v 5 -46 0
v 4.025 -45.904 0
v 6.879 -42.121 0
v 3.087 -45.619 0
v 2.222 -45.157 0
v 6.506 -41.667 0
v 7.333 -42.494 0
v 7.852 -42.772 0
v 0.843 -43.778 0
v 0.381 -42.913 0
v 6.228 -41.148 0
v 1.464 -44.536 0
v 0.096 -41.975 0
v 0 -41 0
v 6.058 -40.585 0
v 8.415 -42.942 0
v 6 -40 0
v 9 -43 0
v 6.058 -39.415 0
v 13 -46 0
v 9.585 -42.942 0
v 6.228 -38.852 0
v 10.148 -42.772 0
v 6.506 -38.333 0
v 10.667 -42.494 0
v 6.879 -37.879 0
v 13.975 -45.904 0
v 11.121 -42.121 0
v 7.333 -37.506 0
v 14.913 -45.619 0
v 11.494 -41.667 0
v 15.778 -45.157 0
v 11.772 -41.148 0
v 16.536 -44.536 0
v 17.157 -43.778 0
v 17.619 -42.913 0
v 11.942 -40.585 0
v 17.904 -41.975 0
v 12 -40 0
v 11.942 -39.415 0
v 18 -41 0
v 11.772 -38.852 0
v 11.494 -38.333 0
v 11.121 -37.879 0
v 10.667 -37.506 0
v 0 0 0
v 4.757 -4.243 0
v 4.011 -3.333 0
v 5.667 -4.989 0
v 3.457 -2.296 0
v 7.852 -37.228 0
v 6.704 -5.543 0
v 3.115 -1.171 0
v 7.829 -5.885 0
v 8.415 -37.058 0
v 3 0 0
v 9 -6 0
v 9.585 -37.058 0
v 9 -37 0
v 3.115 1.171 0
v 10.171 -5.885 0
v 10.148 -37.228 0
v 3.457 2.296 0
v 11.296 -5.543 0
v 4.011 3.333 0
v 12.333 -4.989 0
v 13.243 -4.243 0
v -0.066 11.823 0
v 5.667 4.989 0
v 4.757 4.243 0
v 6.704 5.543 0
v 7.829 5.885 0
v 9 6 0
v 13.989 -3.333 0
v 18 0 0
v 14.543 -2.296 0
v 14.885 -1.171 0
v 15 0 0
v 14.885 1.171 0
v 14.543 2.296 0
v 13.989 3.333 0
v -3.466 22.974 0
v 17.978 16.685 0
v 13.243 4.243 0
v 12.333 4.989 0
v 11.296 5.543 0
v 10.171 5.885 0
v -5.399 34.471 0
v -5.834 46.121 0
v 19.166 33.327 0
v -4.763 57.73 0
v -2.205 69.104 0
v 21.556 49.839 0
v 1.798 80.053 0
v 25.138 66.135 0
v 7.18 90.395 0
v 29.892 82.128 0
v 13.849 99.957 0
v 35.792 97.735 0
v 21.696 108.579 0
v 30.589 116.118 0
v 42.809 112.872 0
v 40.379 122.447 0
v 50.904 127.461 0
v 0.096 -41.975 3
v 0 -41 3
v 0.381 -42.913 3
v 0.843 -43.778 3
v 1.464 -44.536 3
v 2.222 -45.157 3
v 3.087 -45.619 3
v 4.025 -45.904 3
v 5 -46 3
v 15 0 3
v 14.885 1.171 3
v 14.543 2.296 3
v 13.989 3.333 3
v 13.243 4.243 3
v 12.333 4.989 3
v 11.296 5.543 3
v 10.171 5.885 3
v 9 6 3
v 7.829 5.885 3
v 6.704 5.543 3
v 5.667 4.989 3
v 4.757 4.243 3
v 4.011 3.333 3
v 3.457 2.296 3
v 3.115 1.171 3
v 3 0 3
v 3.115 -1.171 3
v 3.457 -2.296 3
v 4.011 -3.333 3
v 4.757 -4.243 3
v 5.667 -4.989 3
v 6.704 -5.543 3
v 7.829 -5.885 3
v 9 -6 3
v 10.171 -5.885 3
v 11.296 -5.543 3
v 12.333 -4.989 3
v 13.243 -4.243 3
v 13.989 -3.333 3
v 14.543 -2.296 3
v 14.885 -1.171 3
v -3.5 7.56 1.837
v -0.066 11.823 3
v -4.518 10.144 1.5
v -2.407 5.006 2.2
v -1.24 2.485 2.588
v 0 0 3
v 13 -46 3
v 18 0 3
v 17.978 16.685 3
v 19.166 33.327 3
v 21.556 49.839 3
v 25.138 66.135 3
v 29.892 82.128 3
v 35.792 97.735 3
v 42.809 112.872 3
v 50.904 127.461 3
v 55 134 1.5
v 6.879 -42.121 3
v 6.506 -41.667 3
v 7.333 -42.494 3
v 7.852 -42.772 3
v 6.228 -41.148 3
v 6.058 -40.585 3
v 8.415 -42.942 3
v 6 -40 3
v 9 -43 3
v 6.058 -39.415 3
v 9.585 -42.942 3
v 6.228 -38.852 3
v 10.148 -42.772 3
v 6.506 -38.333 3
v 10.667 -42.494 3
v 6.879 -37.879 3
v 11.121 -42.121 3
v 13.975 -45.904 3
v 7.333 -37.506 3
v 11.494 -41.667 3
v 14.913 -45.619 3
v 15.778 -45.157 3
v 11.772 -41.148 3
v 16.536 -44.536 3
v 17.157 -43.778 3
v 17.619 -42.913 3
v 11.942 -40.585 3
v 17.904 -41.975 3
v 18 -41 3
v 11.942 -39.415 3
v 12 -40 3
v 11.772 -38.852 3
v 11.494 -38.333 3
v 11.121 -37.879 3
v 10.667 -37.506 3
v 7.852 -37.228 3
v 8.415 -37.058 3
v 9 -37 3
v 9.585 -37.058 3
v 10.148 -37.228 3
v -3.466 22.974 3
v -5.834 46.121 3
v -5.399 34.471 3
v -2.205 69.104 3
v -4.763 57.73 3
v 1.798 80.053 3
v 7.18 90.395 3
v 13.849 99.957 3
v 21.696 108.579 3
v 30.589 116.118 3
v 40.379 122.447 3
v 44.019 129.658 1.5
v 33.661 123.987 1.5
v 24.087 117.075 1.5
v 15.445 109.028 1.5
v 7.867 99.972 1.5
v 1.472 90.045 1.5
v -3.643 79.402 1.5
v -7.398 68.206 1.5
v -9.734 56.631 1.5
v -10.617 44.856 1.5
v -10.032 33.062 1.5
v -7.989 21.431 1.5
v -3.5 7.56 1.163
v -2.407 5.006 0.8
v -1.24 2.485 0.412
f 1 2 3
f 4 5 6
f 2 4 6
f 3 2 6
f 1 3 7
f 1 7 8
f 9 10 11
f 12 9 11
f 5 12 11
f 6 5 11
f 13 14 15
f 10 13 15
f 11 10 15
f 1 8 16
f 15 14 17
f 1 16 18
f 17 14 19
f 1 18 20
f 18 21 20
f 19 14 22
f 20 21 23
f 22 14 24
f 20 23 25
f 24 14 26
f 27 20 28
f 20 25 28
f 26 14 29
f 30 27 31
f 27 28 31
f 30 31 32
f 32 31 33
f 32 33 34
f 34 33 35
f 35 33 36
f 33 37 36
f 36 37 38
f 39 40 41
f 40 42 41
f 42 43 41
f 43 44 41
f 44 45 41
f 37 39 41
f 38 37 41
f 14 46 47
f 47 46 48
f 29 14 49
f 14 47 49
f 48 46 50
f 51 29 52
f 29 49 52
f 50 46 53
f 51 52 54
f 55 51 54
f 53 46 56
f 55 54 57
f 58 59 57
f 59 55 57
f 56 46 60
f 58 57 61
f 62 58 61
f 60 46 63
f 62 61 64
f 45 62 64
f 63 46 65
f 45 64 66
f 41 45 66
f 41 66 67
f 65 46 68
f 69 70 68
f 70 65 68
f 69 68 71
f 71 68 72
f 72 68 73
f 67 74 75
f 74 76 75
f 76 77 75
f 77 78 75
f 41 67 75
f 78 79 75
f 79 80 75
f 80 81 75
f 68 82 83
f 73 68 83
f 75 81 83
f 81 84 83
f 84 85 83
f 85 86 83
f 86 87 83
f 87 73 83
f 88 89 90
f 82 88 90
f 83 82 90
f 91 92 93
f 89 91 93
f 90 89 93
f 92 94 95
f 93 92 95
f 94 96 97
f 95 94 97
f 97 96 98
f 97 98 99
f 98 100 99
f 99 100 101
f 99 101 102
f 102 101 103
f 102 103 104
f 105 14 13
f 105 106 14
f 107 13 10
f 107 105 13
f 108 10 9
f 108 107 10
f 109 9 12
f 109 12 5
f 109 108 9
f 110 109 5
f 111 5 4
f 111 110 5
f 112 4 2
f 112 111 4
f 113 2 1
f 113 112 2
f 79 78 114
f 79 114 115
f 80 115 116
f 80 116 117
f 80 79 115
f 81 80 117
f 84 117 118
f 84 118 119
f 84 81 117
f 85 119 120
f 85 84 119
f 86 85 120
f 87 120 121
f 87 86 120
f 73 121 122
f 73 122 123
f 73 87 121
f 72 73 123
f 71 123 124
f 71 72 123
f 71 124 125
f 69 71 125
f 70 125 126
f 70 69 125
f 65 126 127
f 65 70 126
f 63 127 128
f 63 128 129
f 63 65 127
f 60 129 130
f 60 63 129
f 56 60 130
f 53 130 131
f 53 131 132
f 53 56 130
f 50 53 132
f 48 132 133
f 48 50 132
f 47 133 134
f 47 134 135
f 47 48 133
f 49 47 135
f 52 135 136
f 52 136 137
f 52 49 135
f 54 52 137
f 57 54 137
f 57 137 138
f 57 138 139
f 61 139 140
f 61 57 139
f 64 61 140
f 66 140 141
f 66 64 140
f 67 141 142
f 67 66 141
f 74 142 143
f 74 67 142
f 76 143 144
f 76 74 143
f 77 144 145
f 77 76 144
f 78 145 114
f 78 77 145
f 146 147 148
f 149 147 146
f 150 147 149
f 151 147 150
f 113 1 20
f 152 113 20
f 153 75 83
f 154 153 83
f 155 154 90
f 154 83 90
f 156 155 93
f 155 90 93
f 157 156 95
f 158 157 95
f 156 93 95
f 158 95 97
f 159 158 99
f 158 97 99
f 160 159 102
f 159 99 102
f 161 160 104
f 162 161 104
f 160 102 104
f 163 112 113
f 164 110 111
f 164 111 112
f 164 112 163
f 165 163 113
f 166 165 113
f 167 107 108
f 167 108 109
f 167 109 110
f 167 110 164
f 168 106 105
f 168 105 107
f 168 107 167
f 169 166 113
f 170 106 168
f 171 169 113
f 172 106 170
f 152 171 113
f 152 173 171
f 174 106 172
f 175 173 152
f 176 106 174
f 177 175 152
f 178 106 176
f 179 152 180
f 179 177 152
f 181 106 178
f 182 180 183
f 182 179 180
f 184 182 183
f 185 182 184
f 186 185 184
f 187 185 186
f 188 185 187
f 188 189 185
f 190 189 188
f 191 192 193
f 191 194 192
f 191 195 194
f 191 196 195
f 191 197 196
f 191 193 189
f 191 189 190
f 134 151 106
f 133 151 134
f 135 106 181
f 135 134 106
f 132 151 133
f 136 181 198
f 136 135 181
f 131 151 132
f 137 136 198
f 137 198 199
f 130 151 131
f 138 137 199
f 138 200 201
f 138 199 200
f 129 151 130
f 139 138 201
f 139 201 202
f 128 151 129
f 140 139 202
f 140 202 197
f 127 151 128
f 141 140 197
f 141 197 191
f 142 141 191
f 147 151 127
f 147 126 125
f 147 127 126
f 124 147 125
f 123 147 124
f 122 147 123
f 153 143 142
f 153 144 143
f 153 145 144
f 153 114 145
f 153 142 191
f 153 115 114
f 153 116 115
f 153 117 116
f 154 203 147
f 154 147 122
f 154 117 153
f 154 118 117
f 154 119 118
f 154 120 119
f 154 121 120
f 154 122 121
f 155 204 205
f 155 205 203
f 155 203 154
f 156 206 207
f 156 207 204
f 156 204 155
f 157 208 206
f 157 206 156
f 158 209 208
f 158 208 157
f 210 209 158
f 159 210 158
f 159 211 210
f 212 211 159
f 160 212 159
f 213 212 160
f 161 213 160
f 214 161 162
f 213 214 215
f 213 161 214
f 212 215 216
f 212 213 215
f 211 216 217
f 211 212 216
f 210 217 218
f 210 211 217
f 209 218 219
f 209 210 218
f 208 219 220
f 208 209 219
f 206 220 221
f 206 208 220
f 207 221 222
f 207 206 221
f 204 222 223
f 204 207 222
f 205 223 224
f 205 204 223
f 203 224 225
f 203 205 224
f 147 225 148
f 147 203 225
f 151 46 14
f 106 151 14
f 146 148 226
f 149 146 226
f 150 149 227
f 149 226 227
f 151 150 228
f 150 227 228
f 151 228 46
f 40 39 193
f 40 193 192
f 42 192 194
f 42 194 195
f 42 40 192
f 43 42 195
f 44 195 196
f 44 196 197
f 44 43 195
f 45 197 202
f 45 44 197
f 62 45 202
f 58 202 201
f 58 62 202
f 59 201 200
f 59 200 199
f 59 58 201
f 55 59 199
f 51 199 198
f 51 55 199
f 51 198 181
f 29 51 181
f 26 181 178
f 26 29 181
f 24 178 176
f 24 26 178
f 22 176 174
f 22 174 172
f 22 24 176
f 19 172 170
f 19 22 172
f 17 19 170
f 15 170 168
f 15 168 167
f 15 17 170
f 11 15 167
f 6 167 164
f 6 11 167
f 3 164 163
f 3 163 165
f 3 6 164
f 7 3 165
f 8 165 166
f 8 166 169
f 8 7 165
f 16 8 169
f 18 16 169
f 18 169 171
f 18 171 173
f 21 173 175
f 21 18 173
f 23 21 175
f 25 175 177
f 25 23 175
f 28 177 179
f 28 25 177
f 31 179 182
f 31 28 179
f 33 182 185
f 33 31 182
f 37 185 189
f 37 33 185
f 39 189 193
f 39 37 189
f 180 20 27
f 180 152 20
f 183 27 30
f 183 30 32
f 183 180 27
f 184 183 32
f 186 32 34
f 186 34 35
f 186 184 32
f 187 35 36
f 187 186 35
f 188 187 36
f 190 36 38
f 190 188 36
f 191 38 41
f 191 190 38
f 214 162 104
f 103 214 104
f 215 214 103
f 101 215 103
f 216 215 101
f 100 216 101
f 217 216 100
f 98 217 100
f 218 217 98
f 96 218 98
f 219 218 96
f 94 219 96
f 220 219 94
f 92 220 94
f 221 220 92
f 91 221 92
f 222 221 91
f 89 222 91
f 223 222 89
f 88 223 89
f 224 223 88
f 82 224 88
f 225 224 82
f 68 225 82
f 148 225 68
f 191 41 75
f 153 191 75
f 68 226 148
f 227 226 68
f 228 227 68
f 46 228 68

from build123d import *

# Parameters (mm, degrees)
SKETCH_1_R      = 3
SKETCH_1_R_2    = 6
EXTRUDE_1_DEPTH = 3
FILLET_1_R      = 5


with BuildPart() as part:
    # 草图1 → 凸台-拉伸1 (new body)
    with BuildSketch(Plane.XY):
        with BuildLine():
            Line((0, 0), (0, -46))
            Line((0, -46), (18, -46))
            Line((18, -46), (18, 0))
            ThreePointArc((18, 0), (26.133778881, 69.862314787), (55, 134))
            ThreePointArc((55, 134), (-3.509871984, 79.727932531), (0, 0))
        make_face()
        with Locations((9, -40)):
            Circle(SKETCH_1_R, mode=Mode.SUBTRACT)
        with Locations((9, 0)):
            Circle(SKETCH_1_R_2, mode=Mode.SUBTRACT)
    extrude(amount=EXTRUDE_1_DEPTH)

    # 圆角1
    fillet_1_edges = [part.edges().sort_by_distance(p)[0] for p in [
        (18, -46, 1.5),
        (0, -46, 1.5),
    ]]
    fillet(fillet_1_edges, radius=FILLET_1_R)

    # 切除-扫描5: sweep along a path in 草图14
    with BuildLine(Plane.XY.offset(1.5)) as sweep_5_path:
        ThreePointArc((55, 134), (-1.251298398, 84.80293124), (-4.517936931, 10.144447336))
    # 草图13 → 切除-扫描5 (sweep, cut)
    with BuildSketch(Plane(origin=(89.145258508, 28.985369875, 0), x_dir=(0, 0, 1), z_dir=(-0.9509927898455951, -0.30921305545156413, 0))):
        Polygon((1.5, 110.426315789), (-0.806867017, 103.109868349), (-0.806867017, 111.673722013), (3.806867017, 111.673722013), (3.806867017, 103.109868349), align=None)
    sweep(path=sweep_5_path.line, mode=Mode.SUBTRACT)

    # 切除-扫描6: sweep along a path in 草图16
    with BuildLine(Plane.XY.offset(1.5)) as sweep_6_path:
        Line((-0.066361056, 11.822616816), (0, 0))
    # 草图15 → 切除-扫描6 (sweep, cut)
    with BuildSketch(Plane(origin=(-3.910599214, 10.373403475, 0), x_dir=(0.9357176547303454, 0.3527498697745219, 0), z_dir=(-0.3527498697745219, 0.9357176547303454, 0))):
        Polygon((-2.121804917, 0.787609901), (-2.121804917, -3), (-2.121804917, -3.6210581), (6.078075974, -3.6210581), (-0.649060873, -1.5), (6.606310798, 0.787609901), align=None)
    sweep(path=sweep_6_path.line, mode=Mode.SUBTRACT)


solid = part.part
